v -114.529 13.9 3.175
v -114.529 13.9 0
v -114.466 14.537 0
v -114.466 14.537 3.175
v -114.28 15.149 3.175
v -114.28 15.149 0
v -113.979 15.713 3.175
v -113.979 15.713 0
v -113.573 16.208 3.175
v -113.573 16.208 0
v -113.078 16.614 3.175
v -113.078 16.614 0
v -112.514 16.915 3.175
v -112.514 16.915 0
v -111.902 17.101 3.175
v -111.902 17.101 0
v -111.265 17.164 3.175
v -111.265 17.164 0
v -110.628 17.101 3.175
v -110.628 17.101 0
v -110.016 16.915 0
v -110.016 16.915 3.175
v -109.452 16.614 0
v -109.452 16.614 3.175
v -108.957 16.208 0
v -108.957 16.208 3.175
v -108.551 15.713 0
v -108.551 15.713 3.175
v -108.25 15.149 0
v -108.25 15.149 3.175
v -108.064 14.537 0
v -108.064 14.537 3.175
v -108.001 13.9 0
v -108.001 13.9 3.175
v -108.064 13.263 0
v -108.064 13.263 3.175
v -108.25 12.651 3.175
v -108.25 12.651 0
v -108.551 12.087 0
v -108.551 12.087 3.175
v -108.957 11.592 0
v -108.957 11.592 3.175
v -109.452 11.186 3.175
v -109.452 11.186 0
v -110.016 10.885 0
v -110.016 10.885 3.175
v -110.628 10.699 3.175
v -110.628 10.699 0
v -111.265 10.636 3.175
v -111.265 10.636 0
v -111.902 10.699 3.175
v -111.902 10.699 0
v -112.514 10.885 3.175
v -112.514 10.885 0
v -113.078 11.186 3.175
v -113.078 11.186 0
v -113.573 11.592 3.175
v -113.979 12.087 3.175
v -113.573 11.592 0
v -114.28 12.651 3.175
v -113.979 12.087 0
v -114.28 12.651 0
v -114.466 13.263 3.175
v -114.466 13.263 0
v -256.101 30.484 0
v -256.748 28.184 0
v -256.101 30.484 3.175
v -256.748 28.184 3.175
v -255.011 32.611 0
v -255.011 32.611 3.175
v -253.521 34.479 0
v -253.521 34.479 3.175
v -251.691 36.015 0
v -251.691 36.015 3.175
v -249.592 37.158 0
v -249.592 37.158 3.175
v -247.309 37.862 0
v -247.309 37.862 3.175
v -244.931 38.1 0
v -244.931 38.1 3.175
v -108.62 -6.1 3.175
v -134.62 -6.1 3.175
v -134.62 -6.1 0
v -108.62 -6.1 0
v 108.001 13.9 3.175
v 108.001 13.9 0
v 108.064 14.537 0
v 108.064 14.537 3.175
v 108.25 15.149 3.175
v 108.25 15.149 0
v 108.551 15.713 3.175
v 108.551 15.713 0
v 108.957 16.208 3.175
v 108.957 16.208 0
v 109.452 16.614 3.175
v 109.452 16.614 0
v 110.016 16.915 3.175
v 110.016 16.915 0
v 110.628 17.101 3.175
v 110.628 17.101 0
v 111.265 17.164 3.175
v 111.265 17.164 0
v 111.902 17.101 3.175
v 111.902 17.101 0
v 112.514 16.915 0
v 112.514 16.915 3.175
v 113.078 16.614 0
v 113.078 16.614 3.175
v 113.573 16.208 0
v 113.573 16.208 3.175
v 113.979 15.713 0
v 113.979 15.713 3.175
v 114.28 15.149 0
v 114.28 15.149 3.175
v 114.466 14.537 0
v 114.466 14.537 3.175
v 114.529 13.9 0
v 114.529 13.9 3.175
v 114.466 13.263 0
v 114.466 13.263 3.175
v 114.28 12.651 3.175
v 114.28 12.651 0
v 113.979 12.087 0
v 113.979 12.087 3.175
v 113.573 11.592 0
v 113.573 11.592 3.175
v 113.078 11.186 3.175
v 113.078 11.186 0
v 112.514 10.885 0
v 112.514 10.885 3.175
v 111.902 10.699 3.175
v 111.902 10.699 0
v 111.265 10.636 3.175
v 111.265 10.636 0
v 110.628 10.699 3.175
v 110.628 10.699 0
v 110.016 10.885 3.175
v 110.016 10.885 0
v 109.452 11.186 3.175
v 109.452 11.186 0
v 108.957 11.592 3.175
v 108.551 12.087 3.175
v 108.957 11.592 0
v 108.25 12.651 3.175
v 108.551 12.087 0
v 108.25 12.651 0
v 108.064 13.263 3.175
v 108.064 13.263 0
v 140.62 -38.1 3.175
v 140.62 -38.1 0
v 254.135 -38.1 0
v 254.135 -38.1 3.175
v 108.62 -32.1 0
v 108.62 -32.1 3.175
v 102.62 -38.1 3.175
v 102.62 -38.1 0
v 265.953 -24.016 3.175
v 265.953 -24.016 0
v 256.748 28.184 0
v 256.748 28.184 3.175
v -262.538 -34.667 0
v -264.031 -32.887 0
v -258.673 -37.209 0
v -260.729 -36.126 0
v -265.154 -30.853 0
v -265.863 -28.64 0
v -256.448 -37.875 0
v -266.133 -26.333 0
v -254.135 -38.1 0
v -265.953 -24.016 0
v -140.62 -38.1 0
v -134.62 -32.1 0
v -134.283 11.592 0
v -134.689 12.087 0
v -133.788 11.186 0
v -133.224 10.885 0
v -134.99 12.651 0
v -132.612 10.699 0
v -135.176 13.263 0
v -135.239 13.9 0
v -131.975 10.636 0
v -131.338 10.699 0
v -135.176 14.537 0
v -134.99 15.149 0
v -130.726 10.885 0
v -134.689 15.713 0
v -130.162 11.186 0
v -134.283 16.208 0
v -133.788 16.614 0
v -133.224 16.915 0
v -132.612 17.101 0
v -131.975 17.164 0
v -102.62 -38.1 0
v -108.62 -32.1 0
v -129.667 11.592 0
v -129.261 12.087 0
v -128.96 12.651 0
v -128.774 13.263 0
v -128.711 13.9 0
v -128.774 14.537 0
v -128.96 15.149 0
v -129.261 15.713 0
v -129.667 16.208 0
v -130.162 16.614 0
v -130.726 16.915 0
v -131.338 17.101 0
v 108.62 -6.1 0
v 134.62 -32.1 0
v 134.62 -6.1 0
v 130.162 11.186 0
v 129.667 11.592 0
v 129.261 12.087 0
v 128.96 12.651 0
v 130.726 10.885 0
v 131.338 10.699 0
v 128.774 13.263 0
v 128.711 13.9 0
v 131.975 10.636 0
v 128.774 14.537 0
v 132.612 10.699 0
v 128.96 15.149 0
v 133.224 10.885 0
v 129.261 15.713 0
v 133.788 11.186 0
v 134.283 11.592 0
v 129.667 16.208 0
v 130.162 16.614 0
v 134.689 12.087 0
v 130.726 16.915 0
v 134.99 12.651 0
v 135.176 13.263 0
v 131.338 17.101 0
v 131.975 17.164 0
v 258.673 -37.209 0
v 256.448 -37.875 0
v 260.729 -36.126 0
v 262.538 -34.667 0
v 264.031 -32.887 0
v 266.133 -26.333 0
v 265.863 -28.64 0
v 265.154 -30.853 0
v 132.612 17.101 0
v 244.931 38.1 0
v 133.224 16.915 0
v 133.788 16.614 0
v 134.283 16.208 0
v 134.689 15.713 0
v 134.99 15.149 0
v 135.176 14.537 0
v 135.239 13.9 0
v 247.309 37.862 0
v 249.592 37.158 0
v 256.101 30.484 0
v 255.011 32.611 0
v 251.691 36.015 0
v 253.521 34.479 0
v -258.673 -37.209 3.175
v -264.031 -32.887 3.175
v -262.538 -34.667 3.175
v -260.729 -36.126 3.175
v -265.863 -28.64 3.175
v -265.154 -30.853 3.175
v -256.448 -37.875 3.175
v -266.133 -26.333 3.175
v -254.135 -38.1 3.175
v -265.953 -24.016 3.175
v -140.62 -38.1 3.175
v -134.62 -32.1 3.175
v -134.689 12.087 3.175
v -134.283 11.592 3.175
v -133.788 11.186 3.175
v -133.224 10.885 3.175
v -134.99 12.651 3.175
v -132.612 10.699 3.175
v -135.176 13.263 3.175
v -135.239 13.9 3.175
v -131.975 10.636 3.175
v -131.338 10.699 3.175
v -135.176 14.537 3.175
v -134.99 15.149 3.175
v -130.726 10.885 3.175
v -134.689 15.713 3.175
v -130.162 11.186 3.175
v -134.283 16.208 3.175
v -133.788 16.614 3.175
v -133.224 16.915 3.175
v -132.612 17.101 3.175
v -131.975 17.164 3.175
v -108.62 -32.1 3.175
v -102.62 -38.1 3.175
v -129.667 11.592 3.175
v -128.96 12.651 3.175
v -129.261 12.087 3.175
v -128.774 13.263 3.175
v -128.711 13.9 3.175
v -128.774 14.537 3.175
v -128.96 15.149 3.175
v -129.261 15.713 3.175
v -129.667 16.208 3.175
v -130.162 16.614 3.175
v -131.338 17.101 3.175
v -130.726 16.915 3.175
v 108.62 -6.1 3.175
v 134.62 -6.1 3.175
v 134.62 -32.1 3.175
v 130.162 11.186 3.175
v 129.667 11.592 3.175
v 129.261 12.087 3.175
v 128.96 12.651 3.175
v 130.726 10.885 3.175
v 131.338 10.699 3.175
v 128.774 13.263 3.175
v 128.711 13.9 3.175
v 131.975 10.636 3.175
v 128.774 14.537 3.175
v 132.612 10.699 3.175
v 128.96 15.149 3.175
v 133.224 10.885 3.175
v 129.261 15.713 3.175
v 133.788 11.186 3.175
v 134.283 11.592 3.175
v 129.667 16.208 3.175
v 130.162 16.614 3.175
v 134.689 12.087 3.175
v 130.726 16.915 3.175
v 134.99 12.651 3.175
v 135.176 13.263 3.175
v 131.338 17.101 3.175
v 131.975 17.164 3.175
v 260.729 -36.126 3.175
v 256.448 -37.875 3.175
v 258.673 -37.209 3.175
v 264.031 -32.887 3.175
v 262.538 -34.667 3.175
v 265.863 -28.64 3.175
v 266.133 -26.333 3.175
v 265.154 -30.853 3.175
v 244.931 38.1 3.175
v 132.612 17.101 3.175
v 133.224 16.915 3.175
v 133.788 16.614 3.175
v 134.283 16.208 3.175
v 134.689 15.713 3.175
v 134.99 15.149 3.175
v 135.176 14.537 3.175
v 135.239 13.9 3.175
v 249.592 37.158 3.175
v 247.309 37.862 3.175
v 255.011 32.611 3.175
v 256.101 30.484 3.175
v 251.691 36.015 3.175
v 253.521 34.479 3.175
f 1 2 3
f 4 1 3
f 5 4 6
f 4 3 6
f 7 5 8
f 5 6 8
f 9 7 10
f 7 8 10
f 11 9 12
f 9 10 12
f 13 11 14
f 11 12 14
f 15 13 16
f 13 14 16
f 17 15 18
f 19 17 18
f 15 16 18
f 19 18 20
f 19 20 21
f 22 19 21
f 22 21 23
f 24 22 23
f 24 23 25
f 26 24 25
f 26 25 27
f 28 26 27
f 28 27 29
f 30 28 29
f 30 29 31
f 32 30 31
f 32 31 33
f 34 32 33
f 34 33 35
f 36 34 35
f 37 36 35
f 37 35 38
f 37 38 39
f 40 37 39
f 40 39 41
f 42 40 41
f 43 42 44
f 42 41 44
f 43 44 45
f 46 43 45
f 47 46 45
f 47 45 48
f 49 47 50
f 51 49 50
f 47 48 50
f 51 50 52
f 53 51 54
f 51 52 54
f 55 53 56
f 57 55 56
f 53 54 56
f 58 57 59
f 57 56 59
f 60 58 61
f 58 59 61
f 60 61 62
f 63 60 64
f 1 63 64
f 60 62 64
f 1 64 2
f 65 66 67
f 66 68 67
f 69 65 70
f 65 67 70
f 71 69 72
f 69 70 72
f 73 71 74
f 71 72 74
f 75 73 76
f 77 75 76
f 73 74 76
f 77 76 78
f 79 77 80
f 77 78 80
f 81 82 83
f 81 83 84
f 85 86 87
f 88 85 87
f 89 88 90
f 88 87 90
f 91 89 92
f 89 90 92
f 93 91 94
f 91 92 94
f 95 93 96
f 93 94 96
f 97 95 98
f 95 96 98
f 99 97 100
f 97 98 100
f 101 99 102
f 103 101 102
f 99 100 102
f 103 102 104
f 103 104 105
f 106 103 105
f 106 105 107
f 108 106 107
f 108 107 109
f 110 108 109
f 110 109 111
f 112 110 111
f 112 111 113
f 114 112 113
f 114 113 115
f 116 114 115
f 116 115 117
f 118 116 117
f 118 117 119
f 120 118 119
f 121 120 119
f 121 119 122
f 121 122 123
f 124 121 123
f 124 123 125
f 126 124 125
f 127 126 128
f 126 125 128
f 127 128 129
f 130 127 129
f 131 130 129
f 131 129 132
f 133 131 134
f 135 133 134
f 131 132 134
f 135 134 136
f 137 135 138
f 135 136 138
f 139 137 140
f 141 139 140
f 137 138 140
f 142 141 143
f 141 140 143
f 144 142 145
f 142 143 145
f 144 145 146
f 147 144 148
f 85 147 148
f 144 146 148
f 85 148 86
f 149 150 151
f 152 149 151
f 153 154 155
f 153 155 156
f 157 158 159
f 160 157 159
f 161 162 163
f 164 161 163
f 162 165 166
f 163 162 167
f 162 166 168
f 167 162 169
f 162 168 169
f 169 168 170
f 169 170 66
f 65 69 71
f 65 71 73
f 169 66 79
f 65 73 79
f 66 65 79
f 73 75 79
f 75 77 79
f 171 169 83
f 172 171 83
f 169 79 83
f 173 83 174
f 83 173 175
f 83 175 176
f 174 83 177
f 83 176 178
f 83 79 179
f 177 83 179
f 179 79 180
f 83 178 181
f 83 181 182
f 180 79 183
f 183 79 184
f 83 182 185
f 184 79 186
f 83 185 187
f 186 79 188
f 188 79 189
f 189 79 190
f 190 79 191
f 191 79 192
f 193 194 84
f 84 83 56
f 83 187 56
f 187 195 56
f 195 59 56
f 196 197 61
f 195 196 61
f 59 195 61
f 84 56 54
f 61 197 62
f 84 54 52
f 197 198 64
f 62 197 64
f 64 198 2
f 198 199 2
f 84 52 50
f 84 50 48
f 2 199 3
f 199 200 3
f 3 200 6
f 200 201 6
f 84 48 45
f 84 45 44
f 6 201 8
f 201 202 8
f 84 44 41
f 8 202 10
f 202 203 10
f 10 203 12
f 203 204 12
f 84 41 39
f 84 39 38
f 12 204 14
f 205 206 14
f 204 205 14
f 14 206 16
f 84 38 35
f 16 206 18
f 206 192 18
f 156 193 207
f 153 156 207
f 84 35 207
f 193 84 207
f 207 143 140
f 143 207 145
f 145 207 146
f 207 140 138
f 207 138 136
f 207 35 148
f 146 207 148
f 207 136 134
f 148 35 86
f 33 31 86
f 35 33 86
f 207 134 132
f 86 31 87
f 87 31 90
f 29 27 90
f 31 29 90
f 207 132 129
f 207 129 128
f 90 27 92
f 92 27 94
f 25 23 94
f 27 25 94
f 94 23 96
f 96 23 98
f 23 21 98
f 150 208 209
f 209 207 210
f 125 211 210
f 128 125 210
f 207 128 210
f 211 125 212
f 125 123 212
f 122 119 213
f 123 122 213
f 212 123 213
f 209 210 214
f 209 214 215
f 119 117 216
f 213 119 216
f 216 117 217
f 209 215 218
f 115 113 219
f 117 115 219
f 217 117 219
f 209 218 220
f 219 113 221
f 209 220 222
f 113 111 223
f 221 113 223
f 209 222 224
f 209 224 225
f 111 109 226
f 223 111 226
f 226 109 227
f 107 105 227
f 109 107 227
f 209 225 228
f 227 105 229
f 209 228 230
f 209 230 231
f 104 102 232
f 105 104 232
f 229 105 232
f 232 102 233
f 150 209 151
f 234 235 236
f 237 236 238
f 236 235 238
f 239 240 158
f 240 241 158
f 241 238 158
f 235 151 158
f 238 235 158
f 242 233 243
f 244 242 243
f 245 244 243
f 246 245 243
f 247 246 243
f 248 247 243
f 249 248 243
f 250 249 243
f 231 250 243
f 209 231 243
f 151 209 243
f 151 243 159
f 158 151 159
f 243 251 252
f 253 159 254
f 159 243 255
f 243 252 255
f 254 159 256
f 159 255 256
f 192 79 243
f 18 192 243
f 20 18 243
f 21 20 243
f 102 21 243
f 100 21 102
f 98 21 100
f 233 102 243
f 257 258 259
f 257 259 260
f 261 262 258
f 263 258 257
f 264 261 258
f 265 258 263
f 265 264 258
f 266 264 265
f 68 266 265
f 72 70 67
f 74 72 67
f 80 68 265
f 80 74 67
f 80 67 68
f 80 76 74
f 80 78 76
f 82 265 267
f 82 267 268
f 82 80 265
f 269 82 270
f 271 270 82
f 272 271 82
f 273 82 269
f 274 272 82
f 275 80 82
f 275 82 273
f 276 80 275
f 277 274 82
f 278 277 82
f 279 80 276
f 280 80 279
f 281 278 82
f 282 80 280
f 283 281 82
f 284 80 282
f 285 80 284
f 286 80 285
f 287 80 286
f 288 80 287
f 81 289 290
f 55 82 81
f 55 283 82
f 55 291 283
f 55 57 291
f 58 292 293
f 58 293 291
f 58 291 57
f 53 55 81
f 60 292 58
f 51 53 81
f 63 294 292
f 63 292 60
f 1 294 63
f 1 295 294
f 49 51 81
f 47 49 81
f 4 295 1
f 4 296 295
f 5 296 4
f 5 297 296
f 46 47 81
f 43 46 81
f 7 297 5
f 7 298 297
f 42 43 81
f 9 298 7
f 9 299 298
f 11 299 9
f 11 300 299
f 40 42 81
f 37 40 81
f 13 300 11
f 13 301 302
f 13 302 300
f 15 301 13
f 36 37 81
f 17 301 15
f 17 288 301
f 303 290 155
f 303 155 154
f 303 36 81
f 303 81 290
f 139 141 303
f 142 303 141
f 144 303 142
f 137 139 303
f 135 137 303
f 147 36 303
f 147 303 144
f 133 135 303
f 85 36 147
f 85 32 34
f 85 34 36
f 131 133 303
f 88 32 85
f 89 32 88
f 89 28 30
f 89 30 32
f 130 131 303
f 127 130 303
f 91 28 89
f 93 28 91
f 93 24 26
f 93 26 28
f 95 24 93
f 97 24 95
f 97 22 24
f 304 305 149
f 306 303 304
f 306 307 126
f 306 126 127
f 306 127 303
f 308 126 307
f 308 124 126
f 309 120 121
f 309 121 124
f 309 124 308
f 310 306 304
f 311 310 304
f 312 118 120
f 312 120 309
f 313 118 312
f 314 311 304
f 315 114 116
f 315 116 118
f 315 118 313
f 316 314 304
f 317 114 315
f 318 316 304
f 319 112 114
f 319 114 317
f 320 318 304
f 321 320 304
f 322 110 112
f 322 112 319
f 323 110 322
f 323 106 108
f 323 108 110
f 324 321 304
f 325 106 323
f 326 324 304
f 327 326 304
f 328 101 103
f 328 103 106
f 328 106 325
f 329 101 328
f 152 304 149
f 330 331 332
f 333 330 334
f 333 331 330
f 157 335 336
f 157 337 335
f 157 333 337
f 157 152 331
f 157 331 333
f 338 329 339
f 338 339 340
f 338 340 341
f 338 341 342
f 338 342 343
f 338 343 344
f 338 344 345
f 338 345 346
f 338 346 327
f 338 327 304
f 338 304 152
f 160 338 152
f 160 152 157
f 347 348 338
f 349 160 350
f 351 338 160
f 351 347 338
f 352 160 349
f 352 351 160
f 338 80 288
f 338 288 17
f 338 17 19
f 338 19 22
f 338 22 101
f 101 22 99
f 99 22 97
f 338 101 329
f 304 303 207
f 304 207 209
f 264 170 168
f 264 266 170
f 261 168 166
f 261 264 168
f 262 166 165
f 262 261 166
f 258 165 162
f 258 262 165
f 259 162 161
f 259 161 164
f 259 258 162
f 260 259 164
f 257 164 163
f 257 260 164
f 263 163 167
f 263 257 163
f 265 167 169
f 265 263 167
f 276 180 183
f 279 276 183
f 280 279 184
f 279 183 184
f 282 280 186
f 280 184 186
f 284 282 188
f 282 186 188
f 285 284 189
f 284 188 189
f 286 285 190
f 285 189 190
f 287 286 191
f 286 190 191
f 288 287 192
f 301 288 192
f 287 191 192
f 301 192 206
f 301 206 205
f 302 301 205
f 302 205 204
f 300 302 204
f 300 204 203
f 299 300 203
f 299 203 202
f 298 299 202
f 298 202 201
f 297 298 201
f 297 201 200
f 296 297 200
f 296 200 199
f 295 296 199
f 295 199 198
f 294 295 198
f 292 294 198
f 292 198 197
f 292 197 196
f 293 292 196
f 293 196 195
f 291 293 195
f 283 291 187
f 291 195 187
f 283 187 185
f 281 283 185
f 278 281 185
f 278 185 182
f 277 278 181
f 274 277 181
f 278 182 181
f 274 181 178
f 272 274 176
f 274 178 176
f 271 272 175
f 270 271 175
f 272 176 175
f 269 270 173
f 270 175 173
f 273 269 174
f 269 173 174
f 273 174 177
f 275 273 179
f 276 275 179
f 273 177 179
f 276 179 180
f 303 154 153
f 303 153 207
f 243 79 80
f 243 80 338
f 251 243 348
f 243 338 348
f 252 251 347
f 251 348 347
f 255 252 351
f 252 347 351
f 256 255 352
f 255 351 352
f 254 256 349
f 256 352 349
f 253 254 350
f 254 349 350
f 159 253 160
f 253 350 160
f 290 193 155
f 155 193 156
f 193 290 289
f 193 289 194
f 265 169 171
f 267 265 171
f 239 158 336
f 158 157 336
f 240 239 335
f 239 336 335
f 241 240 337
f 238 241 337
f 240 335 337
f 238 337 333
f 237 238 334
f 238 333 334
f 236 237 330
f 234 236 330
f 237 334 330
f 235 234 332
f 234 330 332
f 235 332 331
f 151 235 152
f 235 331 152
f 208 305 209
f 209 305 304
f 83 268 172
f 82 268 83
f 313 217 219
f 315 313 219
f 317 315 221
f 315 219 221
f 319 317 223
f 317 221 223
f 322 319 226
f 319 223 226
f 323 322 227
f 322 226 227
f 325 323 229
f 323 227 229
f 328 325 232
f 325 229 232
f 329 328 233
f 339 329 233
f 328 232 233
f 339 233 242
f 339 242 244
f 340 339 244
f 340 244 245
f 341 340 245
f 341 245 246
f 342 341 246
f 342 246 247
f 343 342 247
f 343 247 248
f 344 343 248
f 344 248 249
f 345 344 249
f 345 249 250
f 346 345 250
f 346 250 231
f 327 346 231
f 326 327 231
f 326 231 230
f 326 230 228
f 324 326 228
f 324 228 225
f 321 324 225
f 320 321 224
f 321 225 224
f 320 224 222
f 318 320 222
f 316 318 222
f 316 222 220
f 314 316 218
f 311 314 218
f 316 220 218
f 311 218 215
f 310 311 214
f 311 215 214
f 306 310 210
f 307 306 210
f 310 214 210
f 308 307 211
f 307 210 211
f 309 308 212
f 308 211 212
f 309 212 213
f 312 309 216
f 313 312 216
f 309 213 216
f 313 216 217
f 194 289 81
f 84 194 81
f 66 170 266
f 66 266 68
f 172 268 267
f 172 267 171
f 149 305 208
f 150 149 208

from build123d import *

# Parameters (mm, degrees)
SKETCH1_W               = 510
SKETCH1_H               = 76.2
BOSS_EXTRUDE1_DEPTH     = 3.175
SKETCH2_W               = 26
SKETCH2_H               = 32
CUT_EXTRUDE1_DEPTH      = 258.850132102
F_1_4_CLEARANCE_HOLE1_D = 6.5278
DRAFT1_ANGLE            = 10
FILLET1_R               = 12
CHAMFER1_SIZE           = 6


with BuildPart() as part:
    # Sketch1 → Boss-Extrude1 (new body)
    with BuildSketch(Plane.XY):
        Rectangle(SKETCH1_W, SKETCH1_H)
    extrude(amount=BOSS_EXTRUDE1_DEPTH)

    # Sketch2 → Cut-Extrude1 (cut, through all)
    with BuildSketch(Plane.XY.offset(3.175)):
        with Locations((121.62, -22.1)):
            Rectangle(SKETCH2_W, SKETCH2_H)
        with Locations((-121.62, -22.1)):
            Rectangle(SKETCH2_W, SKETCH2_H)
    extrude(amount=-CUT_EXTRUDE1_DEPTH, mode=Mode.SUBTRACT)

    # 1/4 Clearance Hole1 (through all)
    with Locations(Plane.XY.offset(3.175)):
        with Locations((-131.975, 13.9), (-111.265, 13.9), (111.265, 13.9), (131.975, 13.9)):
            Hole(F_1_4_CLEARANCE_HOLE1_D / 2)

    # Draft1
    draft1_faces = [part.faces().sort_by_distance(p)[0] for p in [
        (255, 0, 1.5875),
        (-255, 0, 1.5875),
    ]]
    draft(draft1_faces, Plane(origin=(255, 38.1, 3.175), x_dir=(1, 0, 0), z_dir=(0, 1, 0)), DRAFT1_ANGLE)

    # Fillet1
    fillet1_edges = [part.edges().sort_by_distance(p)[0] for p in [
        (-268.43611593, -38.1, 1.5875),
        (-255, 38.1, 1.5875),
        (255, 38.1, 1.5875),
        (268.43611593, -38.1, 1.5875),
    ]]
    fillet(fillet1_edges, radius=FILLET1_R)

    # Chamfer1
    chamfer1_edges = [part.edges().sort_by_distance(p)[0] for p in [
        (-134.62, -38.1, 1.5875),
        (134.62, -38.1, 1.5875),
        (108.62, -38.1, 1.5875),
        (-108.62, -38.1, 1.5875),
    ]]
    chamfer(chamfer1_edges, length=CHAMFER1_SIZE)


solid = part.part
